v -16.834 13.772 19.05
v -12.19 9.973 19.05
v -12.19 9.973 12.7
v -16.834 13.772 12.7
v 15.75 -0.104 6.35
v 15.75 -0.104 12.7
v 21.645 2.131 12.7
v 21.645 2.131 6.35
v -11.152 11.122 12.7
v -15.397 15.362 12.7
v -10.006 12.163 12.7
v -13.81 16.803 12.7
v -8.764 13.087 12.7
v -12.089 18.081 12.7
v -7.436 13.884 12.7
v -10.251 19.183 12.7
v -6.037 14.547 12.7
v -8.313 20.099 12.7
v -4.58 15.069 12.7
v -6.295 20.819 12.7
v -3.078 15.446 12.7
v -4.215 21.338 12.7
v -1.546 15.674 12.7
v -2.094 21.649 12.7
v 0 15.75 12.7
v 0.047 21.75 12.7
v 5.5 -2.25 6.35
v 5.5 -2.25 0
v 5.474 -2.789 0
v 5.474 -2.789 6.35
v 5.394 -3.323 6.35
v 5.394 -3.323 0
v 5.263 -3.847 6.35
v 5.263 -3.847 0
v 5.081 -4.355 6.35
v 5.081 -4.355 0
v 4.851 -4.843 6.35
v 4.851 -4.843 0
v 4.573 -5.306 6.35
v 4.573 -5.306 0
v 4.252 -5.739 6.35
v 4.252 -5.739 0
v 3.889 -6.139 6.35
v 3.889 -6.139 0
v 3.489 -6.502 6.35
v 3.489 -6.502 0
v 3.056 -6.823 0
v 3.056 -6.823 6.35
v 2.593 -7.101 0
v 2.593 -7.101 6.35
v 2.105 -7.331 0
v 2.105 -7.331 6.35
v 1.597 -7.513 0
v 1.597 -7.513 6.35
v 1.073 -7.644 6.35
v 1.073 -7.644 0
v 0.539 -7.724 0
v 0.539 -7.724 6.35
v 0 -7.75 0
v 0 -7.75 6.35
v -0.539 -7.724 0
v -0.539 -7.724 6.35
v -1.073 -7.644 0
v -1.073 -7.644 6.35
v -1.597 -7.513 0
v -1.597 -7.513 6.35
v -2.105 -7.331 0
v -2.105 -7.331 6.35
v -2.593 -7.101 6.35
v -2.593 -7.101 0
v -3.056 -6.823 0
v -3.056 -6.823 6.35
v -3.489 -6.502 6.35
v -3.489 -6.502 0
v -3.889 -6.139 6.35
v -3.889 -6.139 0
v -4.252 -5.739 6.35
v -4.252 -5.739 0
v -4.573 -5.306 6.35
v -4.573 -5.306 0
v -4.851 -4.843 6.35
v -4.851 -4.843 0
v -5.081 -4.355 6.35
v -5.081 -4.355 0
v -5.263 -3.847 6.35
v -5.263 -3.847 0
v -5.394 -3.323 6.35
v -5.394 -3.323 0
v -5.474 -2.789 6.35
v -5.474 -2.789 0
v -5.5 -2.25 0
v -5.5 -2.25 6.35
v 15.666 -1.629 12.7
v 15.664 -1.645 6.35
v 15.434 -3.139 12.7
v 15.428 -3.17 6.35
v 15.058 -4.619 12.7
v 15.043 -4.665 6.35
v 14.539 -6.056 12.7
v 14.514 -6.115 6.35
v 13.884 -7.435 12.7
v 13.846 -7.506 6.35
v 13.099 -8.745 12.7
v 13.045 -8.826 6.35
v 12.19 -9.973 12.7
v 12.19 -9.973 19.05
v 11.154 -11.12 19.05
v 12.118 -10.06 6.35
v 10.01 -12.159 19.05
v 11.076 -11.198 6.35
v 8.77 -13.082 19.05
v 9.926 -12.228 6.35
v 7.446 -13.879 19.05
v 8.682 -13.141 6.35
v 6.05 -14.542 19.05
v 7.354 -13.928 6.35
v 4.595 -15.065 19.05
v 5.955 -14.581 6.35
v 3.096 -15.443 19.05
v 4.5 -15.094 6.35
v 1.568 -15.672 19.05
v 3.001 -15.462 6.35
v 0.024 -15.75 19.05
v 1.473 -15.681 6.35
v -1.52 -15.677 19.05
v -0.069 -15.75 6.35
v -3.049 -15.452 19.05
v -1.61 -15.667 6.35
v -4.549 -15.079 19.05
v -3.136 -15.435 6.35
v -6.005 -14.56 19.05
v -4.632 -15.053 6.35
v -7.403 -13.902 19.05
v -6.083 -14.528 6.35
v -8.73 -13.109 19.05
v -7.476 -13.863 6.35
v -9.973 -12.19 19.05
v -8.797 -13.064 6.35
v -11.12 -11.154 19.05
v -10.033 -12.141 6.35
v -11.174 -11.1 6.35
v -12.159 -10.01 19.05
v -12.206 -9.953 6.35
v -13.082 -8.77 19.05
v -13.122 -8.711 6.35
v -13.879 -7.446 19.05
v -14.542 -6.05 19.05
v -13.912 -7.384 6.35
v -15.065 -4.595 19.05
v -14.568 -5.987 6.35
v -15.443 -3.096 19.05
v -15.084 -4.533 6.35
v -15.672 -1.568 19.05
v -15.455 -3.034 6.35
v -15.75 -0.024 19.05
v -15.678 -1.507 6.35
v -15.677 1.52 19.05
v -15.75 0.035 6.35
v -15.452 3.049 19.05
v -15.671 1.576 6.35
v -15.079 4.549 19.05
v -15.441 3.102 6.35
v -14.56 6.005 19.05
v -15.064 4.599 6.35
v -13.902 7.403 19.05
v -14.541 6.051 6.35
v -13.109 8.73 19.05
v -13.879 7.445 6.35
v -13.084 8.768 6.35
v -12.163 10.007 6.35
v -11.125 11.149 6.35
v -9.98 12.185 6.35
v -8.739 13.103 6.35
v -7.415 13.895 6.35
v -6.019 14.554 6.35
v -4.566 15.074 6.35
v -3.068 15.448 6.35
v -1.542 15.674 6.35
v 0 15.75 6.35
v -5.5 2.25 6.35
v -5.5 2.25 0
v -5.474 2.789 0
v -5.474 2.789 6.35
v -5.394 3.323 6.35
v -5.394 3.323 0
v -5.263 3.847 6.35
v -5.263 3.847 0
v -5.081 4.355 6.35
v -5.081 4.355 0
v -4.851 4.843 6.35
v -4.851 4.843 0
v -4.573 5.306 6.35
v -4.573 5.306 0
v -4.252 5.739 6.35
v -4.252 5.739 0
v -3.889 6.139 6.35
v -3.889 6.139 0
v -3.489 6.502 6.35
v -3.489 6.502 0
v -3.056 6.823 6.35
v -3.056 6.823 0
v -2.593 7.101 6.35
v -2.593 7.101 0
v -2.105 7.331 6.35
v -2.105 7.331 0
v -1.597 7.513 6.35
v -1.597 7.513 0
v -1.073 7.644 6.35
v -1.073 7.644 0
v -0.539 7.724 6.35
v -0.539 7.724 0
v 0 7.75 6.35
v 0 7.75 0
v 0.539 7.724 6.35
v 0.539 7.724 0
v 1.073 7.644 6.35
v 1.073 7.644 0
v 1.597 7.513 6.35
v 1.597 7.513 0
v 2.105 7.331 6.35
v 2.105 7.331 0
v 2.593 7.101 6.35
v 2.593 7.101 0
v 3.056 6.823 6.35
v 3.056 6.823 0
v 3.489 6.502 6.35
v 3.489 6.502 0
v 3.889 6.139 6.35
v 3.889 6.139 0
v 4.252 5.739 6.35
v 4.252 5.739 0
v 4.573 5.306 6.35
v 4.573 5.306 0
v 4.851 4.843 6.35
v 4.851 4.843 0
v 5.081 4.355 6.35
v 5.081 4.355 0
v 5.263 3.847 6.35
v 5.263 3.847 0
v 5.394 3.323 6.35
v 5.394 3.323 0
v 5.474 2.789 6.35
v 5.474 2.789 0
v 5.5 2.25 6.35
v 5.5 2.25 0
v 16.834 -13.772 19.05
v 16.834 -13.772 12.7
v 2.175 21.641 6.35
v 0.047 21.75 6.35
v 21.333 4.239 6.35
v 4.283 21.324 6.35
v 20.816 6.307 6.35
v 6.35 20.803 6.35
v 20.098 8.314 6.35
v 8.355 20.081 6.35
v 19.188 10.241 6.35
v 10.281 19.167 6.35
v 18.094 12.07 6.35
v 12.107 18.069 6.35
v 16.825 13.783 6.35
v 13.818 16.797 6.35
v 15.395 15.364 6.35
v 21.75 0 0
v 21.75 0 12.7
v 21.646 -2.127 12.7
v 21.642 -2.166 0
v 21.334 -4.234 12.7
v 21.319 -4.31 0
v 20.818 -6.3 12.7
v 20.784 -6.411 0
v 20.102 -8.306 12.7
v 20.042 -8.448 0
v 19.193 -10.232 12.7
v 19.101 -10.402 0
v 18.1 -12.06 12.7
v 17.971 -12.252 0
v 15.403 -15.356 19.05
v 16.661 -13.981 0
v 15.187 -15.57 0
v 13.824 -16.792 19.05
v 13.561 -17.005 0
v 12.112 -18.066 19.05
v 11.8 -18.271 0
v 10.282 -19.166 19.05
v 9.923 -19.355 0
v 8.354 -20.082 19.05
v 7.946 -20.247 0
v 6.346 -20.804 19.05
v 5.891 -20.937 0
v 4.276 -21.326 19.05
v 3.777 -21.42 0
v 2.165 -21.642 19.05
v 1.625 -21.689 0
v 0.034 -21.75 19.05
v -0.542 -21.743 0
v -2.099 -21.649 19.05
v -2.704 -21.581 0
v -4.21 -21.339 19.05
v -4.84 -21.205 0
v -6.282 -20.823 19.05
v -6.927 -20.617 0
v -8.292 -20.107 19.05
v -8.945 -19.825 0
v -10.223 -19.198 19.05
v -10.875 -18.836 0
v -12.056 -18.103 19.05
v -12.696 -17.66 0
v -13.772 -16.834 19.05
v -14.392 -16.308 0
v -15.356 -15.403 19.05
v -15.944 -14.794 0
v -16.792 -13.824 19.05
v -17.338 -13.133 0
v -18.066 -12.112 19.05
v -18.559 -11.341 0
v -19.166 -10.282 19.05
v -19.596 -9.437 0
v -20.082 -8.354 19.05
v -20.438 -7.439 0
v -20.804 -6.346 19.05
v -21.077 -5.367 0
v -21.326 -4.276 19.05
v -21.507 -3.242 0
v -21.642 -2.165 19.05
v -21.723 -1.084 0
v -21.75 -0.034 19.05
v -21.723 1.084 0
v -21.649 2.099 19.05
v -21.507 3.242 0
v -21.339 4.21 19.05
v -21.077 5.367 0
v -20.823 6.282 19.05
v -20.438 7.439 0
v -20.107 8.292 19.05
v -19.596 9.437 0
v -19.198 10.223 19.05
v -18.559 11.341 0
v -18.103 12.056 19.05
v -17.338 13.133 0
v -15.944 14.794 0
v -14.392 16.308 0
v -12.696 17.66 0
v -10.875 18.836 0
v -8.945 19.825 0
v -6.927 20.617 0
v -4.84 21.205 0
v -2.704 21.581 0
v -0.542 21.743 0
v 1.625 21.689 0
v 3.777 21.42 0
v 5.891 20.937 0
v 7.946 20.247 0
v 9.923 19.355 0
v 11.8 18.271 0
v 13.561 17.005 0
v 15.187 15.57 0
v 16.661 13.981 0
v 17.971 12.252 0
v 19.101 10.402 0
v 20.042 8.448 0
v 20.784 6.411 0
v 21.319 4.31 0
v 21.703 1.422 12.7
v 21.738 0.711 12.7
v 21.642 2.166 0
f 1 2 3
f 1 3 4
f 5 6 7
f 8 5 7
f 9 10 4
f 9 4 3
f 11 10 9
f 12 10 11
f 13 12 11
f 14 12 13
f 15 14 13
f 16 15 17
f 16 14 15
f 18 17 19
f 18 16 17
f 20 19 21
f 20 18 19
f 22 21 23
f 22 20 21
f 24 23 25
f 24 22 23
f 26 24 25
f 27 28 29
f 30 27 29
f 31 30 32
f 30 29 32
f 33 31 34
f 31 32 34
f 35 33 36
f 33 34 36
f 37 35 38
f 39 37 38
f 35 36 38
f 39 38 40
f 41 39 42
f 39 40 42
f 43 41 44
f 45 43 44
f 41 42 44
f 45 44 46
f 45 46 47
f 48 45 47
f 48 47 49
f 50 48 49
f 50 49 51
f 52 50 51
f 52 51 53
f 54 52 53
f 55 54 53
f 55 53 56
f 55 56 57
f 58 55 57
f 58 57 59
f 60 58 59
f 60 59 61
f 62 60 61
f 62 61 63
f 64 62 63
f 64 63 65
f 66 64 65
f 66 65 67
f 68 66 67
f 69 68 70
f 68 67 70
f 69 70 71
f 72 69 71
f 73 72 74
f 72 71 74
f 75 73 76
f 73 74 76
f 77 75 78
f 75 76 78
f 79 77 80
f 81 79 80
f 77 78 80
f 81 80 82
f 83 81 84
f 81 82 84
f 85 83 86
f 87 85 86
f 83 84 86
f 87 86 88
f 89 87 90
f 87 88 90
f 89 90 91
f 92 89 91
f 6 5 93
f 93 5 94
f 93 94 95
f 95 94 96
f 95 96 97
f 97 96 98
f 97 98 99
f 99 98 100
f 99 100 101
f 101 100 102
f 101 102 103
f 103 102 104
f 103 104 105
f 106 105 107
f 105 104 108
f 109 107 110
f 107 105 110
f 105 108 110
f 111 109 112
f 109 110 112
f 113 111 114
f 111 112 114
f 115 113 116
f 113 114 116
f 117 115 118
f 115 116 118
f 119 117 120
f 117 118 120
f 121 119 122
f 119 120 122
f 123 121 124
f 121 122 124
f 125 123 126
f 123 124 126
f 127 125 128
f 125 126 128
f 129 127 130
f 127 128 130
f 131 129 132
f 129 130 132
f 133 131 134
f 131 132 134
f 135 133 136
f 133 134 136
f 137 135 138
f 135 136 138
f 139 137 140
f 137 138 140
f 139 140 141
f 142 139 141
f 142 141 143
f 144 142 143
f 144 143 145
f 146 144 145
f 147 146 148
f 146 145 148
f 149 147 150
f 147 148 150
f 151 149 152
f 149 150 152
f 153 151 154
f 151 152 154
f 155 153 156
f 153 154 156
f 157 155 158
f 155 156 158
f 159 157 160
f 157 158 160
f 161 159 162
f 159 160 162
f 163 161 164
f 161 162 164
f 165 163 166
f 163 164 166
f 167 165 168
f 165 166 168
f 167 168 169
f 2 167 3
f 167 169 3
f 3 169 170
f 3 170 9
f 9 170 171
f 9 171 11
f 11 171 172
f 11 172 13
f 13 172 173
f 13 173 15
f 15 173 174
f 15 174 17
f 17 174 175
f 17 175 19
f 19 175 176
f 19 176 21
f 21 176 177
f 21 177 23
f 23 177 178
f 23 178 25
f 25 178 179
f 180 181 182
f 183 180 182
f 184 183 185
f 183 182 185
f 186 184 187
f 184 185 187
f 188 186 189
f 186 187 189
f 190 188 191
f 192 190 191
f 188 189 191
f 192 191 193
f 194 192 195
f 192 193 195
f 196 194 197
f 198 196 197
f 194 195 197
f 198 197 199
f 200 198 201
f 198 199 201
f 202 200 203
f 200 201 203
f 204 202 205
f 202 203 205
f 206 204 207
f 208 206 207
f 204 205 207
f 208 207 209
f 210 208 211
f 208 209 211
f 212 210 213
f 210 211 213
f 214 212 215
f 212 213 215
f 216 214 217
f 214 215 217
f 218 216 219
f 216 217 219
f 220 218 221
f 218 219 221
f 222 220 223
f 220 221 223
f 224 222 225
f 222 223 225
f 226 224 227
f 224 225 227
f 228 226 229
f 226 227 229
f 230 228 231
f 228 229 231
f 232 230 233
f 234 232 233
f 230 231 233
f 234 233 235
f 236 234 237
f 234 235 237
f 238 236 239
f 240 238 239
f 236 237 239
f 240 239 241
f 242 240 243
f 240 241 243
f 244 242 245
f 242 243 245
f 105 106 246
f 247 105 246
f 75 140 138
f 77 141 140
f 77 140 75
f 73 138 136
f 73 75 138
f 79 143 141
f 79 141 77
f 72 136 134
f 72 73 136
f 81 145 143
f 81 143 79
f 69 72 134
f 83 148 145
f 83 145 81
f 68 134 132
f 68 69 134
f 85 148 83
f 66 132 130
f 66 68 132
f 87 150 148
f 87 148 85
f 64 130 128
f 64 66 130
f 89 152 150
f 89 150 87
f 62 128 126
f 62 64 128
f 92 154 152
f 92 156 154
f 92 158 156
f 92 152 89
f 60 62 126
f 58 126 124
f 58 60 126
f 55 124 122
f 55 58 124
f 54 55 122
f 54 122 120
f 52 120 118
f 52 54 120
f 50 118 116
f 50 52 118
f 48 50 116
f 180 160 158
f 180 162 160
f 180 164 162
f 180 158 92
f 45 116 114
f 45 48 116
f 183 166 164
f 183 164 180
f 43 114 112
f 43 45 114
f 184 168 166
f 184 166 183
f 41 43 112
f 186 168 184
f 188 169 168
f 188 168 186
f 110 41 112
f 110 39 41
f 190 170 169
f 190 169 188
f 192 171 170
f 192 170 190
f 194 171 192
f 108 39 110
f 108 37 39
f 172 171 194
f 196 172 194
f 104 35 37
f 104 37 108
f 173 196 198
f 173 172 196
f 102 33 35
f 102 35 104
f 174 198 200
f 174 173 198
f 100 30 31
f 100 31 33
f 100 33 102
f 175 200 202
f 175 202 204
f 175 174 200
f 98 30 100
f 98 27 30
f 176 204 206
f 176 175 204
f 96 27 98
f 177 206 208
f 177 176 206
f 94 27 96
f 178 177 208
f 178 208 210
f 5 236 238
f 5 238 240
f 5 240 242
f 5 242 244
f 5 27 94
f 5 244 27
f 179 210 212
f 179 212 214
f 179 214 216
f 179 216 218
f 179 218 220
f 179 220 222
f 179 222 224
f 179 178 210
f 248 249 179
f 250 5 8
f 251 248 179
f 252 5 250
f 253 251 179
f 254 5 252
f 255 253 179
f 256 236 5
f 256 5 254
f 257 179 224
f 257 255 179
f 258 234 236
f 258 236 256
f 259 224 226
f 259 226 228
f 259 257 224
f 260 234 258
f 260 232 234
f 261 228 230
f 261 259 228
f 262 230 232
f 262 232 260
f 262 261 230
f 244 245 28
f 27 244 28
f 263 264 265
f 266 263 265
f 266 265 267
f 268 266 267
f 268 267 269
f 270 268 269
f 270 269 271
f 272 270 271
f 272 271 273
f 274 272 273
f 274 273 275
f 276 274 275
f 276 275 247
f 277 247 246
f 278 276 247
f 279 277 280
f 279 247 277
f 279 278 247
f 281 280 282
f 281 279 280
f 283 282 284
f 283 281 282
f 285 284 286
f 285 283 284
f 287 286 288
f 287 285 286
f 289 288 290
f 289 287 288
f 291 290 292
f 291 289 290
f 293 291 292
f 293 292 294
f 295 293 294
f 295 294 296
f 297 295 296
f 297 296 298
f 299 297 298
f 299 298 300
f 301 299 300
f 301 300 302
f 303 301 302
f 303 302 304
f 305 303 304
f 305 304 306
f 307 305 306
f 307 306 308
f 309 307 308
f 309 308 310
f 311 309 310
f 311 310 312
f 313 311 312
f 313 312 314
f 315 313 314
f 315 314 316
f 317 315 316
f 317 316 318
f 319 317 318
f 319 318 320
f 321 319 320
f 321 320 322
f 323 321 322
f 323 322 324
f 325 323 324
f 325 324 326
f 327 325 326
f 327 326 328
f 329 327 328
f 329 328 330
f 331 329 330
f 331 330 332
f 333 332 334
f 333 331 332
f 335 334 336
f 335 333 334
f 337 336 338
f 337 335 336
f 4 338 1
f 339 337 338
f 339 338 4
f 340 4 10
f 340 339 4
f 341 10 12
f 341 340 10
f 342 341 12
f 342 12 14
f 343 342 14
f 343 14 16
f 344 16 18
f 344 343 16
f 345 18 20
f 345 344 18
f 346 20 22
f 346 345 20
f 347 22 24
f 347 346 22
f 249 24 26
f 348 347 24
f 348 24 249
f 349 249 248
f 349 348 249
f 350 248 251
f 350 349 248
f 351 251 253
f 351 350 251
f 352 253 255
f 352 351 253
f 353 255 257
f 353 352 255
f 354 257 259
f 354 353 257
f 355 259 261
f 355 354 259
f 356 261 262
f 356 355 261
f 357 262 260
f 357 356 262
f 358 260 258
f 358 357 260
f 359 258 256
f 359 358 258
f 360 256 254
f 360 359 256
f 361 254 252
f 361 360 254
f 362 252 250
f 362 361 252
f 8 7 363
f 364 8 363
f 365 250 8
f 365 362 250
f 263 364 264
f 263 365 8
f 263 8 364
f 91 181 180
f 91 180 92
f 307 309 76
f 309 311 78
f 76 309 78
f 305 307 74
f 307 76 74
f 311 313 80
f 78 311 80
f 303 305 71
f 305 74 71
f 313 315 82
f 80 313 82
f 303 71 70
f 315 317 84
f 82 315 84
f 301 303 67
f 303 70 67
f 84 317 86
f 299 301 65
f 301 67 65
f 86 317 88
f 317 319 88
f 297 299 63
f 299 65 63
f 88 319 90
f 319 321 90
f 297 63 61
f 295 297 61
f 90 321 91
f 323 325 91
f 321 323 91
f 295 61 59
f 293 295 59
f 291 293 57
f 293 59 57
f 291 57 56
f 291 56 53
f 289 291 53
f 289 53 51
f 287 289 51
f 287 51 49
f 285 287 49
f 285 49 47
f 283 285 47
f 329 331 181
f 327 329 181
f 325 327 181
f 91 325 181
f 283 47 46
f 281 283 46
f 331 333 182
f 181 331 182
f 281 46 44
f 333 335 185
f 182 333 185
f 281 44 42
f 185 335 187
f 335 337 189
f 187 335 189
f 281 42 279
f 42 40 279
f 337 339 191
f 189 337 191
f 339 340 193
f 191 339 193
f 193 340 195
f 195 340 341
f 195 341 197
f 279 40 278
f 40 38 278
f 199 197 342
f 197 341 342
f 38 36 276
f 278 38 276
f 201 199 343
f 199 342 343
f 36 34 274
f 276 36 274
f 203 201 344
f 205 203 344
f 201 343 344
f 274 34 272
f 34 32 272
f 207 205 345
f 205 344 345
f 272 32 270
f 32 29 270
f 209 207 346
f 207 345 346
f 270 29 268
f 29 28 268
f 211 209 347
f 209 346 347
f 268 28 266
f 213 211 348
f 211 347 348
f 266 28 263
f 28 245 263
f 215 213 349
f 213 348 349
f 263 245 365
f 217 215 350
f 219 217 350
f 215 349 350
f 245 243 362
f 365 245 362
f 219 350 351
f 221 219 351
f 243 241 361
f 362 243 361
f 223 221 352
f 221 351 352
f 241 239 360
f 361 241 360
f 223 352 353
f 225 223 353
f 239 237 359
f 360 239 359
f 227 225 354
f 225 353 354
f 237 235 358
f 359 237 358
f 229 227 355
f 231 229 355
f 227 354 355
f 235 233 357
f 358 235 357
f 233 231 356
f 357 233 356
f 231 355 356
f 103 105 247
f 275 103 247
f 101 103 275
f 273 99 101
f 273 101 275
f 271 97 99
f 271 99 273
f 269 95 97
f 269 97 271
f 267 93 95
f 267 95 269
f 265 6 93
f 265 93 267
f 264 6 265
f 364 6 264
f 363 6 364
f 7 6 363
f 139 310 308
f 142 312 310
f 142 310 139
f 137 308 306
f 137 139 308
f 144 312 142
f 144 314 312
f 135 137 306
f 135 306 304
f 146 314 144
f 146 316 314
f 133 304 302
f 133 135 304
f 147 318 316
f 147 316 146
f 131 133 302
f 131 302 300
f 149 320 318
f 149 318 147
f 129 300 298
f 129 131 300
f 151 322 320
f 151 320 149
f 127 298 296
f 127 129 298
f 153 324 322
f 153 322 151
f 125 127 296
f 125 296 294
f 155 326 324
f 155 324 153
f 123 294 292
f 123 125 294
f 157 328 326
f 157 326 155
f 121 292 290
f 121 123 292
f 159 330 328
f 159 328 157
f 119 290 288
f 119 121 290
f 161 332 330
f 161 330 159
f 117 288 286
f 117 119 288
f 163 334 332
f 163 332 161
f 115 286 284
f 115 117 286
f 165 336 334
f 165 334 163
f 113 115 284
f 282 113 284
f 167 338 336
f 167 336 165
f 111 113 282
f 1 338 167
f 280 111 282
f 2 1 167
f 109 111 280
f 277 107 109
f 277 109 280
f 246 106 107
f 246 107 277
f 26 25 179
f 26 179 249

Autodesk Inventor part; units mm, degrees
ref_plane "YZ Plane" through (0, 0, 0) normal (1, 0, 0) x (0, 1, 0)
ref_plane "XZ Plane" through (0, 0, 0) normal (0, 1, 0) x (-1, 0, 0)
ref_plane "XY Plane" through (0, 0, 0) normal (0, 0, 1) x (1, 0, 0)
sketch "Sketch1" plane through (0, 0, 0) normal (0, 0, 1) x (1, 0, 0)
  circle A0 centre (0, 0) radius 15.75
  circle A1 centre (0, 0) radius 21.75
  dimension "d1" = 31.5
  dimension "d2" = 43.5
extrude "Extrusion1" add sketch "Sketch1" along normal blind 6.35 contours A0 | A1
sketch "Sketch2" plane through (0, 0, 6.35) normal (0, 0, 1) x (1, 0, 0)
  circle A0 centre (0, 0) radius 21.75
  circle A1 centre (0, 0) radius 15.75
  dimension "d5" = 31.5
extrude "Extrusion2" add sketch "Sketch2" along normal blind 6.35
sketch "Sketch3" plane through (0, 0, 6.35) normal (0, 0, 1) x (1, 0, 0)
  line L0 (0, -4.75) -> (0, -8.25)
  line L1 (0, -8.25) -> (0, -4.75)
  line L2 (0, 4.75) -> (0, 8.25)
  line L3 (0, 0) -> (0, -1.75)
  line L4 (0, 0) -> (0, 1.75)
  line L5 (0, 0) -> (0, 2.25)
  line L6 (0, 0) -> (0, -2.25)
  line L7 (4.7631, 0) -> (0, 0)
  arc A0 (-5.5, -2.25) -> (5.5, -2.25) centre (0, -2.25) ccw
  arc A1 (5.5, 2.25) -> (-5.5, 2.25) centre (0, 2.25) ccw
  line L8 (-5.5, 2.25) -> (-5.5, -2.25)
  line L9 (5.5, 2.25) -> (5.5, -2.25)
  point P0 (-5.5102, 0)
  dimension "d11" = 8.25
  dimension "d12" = 8.25
  dimension "d32" = 2.25
  dimension "d33" = 2.25
extrude "Extrusion3" cut sketch "Sketch3" along normal through all both and the other way through all
sketch "Sketch4" plane through (0, 0, 12.7) normal (0, 0, 1) x (1, 0, 0)
  point P0 (0, 0)
sketch "Sketch5" plane through (0, 0, 12.7) normal (0, 0, 1) x (1, 0, 0)
  circle A0 centre (0, 0) radius 15.75 projected
  line L0 (0, 15.75) -> (0, 21.75)
  circle A1 centre (0, 0) radius 21.75 projected
  line L1 (-14.7967, 5.3964) -> (-20.2679, 7.8914)
  arc A2 (0, 15.75) -> (-14.7967, 5.3964) centre (0, 0) ccw
  arc A3 (0, 21.75) -> (-20.2679, 7.8914) centre (0, 0) ccw
extrude "Extrusion4" cut sketch "Sketch5" against normal blind 6.35 contours A0 L1 A1 L0 picked at (-1.7226, 19.5424)
sketch "Sketch6" plane through (0, 0, 12.7) normal (0, 0, 1) x (1, 0, 0)
  point P0 (0, 0)
sketch "Sketch7" plane through (0, 0, 12.7) normal (0, 0, 1) x (1, 0, 0)
  circle A0 centre (0, 0) radius 21.75
  circle A1 centre (0, 0) radius 15.75
extrude "Extrusion5" add sketch "Sketch7" against normal blind 6.35
sketch "Sketch8" plane through (0, 0, 12.7) normal (0, 0, 1) x (1, 0, 0)
  point P0 (0, 0)
sketch "Sketch9" plane through (0, 0, 12.7) normal (0, 0, 1) x (1, 0, 0)
  circle A0 centre (0, 0) radius 15.75
  circle A1 centre (0, 0) radius 21.75
  circle A2 centre (0, 0) radius 21.75 projected
  circle A3 centre (0, 0) radius 15.75 projected
  line L0 (15.7497, -0.1038) -> (21.6454, 2.1307)
  arc A4 (15.7497, -0.1038) -> (0, 15.75) centre (0, 0) ccw
  arc A5 (21.6454, 2.1307) -> (2.0753, 21.6508) centre (0, 0) ccw
  line L1 (0, 15.75) -> (0.0466, 21.7499)
  circle A6 centre (0, 0) radius 21.75 projected
  arc A7 (21.6454, 2.1307) -> (0.0466, 21.7499) centre (0, 0) ccw
extrude "Extrusion6" cut sketch "Sketch9" against normal blind 6.35 contours A0 L1 A1 L0 picked at (4.1755, 19.2056)
sketch "Sketch10" plane through (0, 0, 12.7) normal (0, 0, 1) x (1, 0, 0)
  circle A0 centre (0, 0) radius 15.75
  circle A1 centre (0, 0) radius 21.75
  point P0 (15.7497, -0.1038)
extrude "Extrusion7" add sketch "Sketch10" along normal blind 6.35
sketch "Sketch11" plane through (0, 0, 19.05) normal (0, 0, 1) x (1, 0, 0)
  circle A0 centre (0, 0) radius 21.75 projected
  circle A1 centre (0, 0) radius 15.75
  circle A2 centre (0, 0) radius 21.75
  arc A3 (0, 15.75) -> (15.7497, -0.1038) centre (0, 0) ccw projected
  line L0 (12.1903, -9.9729) -> (16.8342, -13.7721)
  line L1 (-12.1903, 9.9729) -> (-16.8342, 13.7721)
  arc A4 (12.1903, -9.9729) -> (-12.1903, 9.9729) centre (0, 0) ccw
  arc A5 (16.8342, -13.7721) -> (-16.8342, 13.7721) centre (0, 0) ccw
  line L2 (-12.1903, 9.9729) -> (-16.8342, 13.7721)
  line L3 (12.1903, -9.9729) -> (16.8342, -13.7721)
  arc A6 (12.1903, -9.9729) -> (-12.1903, 9.9729) centre (0, 0) ccw
  point P0 (6.5, 1.75)
  point P1 (-6.5, 1.75)
extrude "Extrusion8" cut sketch "Sketch11" against normal blind 6.35 contours A0 L0 A1 L1 picked at (19.4008, 2.9309)
properties part number "bracket"
